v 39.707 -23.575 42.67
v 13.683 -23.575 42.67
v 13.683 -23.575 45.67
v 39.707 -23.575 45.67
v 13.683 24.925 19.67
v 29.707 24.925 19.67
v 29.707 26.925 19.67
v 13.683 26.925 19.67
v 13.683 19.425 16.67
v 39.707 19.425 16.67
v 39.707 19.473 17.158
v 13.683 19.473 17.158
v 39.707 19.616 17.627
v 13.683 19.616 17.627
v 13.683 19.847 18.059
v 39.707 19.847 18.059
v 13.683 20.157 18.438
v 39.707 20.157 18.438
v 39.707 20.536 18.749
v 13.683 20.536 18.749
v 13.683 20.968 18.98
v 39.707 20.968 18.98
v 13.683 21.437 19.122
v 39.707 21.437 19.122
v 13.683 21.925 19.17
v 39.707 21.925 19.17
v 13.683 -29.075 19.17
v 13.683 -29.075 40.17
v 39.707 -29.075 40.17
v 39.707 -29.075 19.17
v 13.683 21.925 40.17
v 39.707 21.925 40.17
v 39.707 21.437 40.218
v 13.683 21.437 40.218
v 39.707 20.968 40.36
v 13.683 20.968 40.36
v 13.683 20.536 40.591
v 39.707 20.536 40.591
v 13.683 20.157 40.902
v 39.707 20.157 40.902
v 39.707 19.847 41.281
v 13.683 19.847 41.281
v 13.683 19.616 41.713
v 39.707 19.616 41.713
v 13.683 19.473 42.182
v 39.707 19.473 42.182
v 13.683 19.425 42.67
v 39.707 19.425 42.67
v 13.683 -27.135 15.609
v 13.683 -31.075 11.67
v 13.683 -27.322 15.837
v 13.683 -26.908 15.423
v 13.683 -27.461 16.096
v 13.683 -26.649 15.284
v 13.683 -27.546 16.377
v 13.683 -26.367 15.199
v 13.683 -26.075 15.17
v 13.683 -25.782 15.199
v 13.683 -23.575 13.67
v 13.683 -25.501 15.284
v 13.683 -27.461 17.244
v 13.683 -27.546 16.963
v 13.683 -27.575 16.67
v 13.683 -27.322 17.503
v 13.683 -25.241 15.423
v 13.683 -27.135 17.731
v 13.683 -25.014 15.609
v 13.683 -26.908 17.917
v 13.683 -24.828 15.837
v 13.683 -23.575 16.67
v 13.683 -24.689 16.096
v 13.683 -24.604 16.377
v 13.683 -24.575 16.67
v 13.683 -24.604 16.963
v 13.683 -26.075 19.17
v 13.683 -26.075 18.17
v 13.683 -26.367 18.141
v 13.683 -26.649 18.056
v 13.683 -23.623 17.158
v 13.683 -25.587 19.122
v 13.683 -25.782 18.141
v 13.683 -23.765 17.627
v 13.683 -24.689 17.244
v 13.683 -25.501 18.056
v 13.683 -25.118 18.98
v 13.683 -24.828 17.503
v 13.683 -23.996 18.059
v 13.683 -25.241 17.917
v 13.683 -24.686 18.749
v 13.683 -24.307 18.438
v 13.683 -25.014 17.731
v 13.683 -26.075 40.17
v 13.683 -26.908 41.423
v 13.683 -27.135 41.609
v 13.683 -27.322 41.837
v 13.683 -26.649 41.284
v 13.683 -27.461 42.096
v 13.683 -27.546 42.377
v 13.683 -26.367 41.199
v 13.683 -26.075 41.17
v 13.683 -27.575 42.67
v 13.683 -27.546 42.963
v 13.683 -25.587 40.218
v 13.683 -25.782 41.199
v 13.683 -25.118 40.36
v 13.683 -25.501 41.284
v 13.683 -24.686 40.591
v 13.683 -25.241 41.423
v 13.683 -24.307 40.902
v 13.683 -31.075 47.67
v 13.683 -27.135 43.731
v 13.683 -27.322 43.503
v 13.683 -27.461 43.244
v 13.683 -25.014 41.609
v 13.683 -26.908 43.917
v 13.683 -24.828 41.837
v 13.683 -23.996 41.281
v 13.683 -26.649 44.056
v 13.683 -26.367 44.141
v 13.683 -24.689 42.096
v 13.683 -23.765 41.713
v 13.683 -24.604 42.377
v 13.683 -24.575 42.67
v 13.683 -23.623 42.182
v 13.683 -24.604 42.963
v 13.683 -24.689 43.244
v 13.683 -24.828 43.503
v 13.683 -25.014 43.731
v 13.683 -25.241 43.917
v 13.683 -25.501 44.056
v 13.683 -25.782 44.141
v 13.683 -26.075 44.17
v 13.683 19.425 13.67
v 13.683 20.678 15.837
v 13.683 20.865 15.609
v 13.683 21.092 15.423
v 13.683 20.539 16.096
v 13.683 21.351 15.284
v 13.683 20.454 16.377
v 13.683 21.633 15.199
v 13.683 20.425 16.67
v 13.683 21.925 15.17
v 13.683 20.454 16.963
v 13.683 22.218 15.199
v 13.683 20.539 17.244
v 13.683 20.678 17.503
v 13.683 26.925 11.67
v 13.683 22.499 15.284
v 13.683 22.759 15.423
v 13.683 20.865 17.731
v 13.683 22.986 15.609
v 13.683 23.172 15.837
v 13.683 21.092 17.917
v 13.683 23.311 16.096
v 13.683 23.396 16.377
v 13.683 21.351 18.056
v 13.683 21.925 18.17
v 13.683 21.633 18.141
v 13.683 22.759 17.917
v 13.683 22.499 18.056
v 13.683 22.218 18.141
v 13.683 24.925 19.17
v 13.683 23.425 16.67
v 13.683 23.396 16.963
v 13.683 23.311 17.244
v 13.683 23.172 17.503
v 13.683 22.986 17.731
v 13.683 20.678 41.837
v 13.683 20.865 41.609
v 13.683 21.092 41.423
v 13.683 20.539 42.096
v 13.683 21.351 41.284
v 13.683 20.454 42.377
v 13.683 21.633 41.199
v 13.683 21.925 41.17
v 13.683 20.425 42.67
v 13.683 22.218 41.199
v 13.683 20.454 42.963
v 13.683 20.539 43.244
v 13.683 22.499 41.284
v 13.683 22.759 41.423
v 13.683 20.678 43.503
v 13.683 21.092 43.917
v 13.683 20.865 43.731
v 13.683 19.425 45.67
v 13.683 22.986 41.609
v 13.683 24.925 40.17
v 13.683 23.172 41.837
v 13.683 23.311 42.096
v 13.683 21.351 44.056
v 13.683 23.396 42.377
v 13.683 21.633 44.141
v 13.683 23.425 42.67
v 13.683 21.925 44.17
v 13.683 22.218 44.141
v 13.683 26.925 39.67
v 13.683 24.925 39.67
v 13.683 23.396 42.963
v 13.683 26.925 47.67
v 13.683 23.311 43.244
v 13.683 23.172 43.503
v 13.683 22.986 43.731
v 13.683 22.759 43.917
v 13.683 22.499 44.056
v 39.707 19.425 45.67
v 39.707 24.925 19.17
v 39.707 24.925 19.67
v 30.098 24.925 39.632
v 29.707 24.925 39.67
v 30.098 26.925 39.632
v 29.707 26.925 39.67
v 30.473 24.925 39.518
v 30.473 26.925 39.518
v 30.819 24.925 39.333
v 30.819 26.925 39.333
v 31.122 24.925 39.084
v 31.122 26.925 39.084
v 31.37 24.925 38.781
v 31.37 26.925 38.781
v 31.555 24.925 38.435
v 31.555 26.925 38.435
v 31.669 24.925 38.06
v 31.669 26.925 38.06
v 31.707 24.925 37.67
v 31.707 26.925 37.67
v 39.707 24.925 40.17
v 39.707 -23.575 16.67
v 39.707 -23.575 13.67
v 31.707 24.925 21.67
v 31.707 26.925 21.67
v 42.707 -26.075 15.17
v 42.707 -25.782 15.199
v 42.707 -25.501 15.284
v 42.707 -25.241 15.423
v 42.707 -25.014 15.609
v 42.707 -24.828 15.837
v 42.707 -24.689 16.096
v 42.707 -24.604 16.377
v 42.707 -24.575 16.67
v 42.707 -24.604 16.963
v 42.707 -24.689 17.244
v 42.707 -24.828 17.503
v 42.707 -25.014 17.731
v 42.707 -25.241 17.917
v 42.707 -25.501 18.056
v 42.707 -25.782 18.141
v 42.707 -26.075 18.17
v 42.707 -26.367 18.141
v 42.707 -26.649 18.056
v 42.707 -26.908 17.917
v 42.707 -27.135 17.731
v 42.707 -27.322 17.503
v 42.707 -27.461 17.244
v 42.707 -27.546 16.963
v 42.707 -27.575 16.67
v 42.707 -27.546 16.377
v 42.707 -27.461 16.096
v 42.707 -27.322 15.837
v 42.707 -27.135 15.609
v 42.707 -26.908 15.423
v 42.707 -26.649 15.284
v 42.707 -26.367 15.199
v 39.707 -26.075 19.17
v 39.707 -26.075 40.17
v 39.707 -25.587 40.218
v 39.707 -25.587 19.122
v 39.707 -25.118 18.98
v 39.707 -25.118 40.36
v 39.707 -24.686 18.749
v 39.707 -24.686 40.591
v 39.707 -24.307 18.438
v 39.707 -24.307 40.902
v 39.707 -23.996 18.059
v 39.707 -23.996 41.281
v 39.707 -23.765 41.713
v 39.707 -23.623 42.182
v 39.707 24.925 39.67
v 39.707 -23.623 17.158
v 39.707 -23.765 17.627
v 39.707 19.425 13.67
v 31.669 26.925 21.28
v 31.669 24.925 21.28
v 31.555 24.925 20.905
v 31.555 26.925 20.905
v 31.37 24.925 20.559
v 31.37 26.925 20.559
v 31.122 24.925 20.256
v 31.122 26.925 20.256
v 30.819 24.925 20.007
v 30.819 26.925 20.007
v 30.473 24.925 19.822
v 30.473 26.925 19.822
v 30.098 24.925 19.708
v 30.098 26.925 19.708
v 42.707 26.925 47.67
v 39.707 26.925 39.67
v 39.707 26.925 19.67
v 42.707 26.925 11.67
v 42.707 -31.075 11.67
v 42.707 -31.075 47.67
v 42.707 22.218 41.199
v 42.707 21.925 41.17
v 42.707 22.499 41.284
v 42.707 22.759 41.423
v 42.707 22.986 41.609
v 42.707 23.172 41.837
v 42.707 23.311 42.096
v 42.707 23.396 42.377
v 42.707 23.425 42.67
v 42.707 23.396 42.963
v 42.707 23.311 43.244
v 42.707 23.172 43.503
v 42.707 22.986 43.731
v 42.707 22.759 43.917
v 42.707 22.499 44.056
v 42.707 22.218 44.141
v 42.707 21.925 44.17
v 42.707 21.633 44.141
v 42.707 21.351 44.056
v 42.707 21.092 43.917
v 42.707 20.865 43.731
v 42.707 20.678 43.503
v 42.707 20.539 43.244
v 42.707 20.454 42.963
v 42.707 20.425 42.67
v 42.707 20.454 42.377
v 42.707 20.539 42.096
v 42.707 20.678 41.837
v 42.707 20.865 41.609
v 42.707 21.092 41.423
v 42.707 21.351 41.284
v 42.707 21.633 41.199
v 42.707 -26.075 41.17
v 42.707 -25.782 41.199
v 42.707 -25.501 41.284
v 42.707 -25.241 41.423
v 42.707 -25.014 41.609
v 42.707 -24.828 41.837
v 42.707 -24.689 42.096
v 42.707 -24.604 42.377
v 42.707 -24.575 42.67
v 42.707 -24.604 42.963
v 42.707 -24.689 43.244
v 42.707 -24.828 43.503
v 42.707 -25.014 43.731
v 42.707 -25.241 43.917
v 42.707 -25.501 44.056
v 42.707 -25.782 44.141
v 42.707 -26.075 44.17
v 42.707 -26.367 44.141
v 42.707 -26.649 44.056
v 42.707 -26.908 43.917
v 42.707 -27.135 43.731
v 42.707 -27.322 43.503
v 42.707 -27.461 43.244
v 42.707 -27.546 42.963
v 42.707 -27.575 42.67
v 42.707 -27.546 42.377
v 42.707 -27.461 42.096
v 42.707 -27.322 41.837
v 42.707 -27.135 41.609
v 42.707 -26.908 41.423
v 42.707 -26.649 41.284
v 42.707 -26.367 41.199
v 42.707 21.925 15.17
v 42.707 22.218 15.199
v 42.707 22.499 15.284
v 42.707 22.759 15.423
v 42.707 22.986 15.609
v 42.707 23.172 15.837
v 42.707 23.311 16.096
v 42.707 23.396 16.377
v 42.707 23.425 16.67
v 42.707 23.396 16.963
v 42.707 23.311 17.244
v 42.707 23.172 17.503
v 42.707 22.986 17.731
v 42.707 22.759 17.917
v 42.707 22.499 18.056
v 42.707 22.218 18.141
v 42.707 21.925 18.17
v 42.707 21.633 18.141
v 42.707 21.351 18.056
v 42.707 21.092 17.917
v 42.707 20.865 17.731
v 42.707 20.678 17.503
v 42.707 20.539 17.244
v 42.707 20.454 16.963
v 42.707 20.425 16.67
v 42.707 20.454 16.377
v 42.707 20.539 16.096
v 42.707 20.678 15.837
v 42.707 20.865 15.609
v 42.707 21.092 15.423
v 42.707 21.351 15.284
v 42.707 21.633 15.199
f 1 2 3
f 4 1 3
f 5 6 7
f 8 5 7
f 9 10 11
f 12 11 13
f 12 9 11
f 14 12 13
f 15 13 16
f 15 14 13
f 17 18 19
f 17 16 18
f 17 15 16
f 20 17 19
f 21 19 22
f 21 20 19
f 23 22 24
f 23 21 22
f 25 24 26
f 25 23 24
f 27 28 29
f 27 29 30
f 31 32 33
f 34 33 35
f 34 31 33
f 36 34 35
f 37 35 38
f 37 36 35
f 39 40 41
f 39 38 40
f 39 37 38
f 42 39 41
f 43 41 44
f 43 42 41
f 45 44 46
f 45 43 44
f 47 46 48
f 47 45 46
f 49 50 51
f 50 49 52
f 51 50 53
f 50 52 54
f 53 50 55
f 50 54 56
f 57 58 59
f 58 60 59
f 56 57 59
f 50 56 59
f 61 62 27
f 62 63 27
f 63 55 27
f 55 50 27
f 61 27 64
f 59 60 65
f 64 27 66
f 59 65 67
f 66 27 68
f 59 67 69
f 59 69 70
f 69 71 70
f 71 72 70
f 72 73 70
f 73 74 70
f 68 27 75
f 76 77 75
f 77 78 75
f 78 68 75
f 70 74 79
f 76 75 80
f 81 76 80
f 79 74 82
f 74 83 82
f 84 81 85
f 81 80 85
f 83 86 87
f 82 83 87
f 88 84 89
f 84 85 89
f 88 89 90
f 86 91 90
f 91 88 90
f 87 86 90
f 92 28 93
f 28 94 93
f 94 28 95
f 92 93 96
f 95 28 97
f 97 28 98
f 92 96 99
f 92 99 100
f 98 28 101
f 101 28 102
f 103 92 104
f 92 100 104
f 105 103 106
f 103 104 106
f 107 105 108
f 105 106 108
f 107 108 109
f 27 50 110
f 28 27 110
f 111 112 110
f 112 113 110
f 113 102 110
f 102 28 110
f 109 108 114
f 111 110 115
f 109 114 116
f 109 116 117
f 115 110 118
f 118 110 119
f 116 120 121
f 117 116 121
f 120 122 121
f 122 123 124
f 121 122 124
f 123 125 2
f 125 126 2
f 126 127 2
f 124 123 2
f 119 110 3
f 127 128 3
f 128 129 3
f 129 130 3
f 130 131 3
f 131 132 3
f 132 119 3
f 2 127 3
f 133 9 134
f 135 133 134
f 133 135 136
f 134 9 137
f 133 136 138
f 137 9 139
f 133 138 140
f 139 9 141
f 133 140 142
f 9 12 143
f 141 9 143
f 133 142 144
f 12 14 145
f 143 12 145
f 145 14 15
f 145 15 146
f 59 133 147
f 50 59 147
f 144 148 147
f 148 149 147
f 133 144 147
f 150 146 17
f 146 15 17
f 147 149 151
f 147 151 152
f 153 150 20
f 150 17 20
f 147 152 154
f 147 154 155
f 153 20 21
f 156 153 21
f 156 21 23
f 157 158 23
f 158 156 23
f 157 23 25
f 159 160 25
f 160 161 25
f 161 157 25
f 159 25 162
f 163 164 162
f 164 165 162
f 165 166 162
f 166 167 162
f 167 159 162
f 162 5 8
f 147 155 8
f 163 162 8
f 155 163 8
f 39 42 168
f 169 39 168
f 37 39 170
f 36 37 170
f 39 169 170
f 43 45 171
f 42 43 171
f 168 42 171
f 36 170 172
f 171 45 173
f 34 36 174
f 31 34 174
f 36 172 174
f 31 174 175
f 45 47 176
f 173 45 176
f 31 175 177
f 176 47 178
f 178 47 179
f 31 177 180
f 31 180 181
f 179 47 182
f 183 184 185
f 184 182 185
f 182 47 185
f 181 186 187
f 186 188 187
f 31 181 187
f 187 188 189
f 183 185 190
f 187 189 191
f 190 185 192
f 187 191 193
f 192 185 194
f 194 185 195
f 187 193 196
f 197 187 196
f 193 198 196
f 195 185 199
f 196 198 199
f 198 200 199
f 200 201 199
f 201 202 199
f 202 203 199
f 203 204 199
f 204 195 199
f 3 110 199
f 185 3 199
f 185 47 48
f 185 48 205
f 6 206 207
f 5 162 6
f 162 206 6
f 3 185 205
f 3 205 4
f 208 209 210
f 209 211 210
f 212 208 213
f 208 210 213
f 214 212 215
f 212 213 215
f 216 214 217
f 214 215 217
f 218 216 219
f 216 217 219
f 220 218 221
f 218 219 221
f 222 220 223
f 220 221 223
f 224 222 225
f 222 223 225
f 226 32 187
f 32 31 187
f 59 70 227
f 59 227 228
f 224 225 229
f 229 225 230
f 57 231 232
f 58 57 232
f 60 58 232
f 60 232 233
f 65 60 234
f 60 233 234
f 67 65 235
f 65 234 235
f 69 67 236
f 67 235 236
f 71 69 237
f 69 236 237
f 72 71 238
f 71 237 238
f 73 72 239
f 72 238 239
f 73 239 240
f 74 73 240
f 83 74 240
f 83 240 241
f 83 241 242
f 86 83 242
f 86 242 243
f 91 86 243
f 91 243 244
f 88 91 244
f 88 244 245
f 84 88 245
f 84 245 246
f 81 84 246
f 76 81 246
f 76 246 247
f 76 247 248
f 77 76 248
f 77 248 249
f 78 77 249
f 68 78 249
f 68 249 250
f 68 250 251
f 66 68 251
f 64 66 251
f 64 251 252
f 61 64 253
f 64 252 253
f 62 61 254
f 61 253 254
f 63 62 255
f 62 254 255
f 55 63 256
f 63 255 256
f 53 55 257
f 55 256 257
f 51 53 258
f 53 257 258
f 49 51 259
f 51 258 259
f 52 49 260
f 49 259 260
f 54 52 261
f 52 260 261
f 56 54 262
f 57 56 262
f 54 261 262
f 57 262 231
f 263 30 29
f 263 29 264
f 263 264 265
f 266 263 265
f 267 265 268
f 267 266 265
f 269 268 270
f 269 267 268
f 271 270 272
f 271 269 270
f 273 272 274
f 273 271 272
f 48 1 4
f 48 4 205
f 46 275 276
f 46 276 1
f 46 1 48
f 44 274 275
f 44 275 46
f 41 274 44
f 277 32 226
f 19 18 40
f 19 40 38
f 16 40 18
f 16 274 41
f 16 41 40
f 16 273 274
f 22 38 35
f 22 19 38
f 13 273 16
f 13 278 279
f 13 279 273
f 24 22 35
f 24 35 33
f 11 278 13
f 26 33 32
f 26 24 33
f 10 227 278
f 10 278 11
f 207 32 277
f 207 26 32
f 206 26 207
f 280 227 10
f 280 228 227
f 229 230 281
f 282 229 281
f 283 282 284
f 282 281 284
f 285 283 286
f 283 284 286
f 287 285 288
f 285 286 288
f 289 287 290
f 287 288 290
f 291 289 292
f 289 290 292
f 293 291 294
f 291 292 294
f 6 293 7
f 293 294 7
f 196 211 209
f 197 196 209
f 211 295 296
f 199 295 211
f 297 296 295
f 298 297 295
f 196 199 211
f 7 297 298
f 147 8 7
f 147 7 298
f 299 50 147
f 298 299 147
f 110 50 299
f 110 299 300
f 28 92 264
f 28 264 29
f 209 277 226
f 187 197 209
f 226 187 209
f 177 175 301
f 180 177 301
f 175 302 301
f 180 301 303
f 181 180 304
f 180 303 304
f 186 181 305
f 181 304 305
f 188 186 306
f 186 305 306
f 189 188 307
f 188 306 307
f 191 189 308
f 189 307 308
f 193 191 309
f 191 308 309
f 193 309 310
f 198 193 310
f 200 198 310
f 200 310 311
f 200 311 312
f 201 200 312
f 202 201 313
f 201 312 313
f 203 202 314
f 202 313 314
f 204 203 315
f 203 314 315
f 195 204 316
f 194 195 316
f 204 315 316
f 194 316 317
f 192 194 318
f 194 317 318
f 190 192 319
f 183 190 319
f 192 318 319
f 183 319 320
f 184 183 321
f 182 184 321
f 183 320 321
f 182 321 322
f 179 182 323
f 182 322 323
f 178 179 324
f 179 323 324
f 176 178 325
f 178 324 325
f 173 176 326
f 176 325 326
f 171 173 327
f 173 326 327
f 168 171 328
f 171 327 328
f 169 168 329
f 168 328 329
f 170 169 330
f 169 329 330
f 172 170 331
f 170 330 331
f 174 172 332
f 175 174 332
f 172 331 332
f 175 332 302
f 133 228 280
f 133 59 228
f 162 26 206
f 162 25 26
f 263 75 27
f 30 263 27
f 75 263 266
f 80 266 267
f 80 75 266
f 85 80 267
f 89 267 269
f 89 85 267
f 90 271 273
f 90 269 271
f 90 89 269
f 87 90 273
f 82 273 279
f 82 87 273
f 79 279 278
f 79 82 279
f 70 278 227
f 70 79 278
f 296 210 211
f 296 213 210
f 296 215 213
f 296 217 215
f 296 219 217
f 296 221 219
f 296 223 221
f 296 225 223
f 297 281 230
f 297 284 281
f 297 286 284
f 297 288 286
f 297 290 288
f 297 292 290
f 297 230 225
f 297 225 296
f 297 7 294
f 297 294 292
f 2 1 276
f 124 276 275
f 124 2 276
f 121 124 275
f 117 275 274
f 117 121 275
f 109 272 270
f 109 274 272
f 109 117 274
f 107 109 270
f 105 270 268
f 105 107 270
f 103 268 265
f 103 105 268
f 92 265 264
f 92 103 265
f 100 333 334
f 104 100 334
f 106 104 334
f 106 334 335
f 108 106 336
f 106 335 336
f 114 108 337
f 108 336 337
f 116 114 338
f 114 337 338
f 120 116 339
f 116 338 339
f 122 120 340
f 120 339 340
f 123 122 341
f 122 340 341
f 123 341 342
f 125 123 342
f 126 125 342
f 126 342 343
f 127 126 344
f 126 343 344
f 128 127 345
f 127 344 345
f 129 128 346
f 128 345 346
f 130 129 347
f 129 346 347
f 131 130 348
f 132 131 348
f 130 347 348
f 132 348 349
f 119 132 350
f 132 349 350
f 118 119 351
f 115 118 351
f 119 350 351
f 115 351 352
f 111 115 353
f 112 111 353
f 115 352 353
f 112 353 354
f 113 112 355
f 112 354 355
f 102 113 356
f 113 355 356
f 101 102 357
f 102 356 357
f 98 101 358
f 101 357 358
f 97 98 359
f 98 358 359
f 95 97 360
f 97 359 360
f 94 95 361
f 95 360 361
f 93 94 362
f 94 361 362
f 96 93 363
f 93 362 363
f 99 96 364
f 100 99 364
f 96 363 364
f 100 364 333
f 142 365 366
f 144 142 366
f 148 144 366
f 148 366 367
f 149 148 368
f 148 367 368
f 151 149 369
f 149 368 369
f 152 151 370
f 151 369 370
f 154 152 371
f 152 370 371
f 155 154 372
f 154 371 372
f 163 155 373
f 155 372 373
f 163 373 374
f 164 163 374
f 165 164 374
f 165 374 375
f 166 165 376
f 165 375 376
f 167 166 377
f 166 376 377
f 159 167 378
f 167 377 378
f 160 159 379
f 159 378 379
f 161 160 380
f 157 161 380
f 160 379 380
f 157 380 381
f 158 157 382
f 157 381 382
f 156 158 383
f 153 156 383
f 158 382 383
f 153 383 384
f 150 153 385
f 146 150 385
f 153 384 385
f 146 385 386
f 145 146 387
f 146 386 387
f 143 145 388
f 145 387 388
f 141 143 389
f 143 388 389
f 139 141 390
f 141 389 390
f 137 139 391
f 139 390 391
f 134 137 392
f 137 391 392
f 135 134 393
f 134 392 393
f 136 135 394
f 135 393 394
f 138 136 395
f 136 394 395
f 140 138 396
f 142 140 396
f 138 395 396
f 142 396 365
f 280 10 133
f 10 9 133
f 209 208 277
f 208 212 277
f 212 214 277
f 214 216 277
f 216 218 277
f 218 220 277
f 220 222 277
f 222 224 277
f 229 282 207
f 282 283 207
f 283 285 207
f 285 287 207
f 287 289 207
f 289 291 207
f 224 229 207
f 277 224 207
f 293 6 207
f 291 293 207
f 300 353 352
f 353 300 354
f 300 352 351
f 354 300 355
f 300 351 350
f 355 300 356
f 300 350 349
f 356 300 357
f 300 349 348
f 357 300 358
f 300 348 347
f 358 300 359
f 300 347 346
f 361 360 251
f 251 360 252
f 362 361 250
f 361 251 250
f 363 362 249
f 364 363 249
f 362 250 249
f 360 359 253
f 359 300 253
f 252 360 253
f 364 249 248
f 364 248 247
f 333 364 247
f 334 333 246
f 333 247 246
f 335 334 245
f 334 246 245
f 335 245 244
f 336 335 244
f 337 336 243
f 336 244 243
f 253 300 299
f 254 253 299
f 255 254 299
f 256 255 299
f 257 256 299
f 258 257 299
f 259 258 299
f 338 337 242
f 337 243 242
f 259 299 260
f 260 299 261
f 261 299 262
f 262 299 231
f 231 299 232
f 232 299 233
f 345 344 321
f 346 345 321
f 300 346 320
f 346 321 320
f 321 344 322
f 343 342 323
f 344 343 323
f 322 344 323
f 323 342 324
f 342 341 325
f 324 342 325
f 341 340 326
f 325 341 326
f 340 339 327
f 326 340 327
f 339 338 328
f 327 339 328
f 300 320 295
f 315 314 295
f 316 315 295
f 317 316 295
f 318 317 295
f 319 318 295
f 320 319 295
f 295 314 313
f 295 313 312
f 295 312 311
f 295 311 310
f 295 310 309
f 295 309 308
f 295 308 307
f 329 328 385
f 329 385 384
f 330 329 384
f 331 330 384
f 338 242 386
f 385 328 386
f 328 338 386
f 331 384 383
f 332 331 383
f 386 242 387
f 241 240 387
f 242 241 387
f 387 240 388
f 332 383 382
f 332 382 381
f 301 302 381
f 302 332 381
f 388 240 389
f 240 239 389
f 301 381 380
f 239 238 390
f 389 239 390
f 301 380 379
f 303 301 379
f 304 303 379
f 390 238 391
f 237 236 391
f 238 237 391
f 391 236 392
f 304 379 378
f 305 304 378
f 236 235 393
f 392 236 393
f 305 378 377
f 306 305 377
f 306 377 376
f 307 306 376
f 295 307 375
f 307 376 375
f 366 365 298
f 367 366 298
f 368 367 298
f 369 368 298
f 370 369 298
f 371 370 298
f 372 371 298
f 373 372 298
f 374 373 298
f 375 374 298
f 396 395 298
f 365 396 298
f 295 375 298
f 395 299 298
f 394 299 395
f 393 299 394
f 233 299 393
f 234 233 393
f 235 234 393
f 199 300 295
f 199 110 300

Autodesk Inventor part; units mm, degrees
ref_plane "YZ Plane" through (0, 0, 0) normal (1, 0, 0) x (0, 1, 0)
ref_plane "XZ Plane" through (0, 0, 0) normal (0, 1, 0) x (-1, 0, 0)
ref_plane "XY Plane" through (0, 0, 0) normal (0, 0, 1) x (1, 0, 0)
ref_plane "Work Plane1" through (13.6834, 18.9252, 14.6894) normal (1, 0, 0) x (0, 1, 0)
sketch "Sketch1" plane through (13.6834, 18.9252, 14.6894) normal (1, 0, 0) x (0, 1, 0)
  circle A0 centre (3, 27.9806) radius 1.5 projected
  circle A1 centre (3, 1.9806) radius 1.5 projected
  circle A2 centre (-45, 1.9806) radius 1.5 projected
  circle A3 centre (-45, 27.9806) radius 1.5 projected
  line L0 (-50, 32.9806) -> (8, 32.9806) projected
  line L1 (8, 32.9806) -> (8, 24.9805) projected
  line L2 (8, -3.0194) -> (8, 4.9808) projected
  line L3 (-50, -3.0194) -> (8, -3.0194) projected
  line L4 (-50, 0) -> (-50, 32.9806) projected
  line L5 (-50, -0.0388) -> (-50, -3.0194) projected
  line L6 (100, 24.9806) -> (0, 24.9806) projected
  line L7 (0, 22.9806) -> (0, 24.9806) projected
  line L8 (0, 22.9806) -> (0, 6.9806) projected
  line L9 (0, 4.9806) -> (0, 6.9806) projected
  line L10 (0, 4.9806) -> (100, 4.9806) projected
  line L11 (6, 24.9806) -> (6, 25.4806)
  line L12 (0.5, 30.9806) -> (-42.5, 30.9806)
  line L13 (-48, 25.4806) -> (-48, 4.4806)
  line L14 (-42.5, -1.0194) -> (0.5, -1.0194)
  line L15 (6, 4.4806) -> (6, 4.9806)
  arc A4 (0.5, 27.9806) -> (3, 25.4806) centre (3, 27.9806) ccw
  arc A5 (3, 4.4806) -> (0.5, 1.9806) centre (3, 1.9806) ccw
  arc A6 (-42.5, 1.9806) -> (-45, 4.4806) centre (-45, 1.9806) ccw
  arc A7 (-45, 25.4806) -> (-42.5, 27.9806) centre (-45, 27.9806) ccw
  line L16 (-45, 25.4806) -> (-48, 25.4806)
  line L17 (-42.5, 27.9806) -> (-42.5, 30.9806)
  line L18 (-45, 4.4806) -> (-48, 4.4806)
  line L19 (-42.5, 1.9806) -> (-42.5, -1.0194)
  line L20 (0.5, 1.9806) -> (0.5, -1.0194)
  line L21 (3, 4.4806) -> (6, 4.4806)
  line L22 (0.5, 27.9806) -> (0.5, 30.9806)
  line L23 (3, 25.4806) -> (6, 25.4806)
  circle A8 centre (-45, 1.9806) radius 1.5
  circle A9 centre (-45, 27.9806) radius 1.5
  circle A10 centre (3, 27.9806) radius 1.5
  circle A11 centre (3, 1.9806) radius 1.5
  line L24 (8, 4.9808) -> (8, -3.0194)
  line L25 (-50, -3.0194) -> (8, -3.0194)
  line L26 (-50, -3.0194) -> (-50, 32.9806)
  line L27 (8, 32.9806) -> (-50, 32.9806)
  line L28 (8, 24.9805) -> (8, 32.9806)
  line L29 (8, 24.9805) -> (0, 24.9806)
  line L30 (0, 4.9806) -> (0, 24.9806)
  line L31 (0, 4.9806) -> (8, 4.9808)
  point P0 (-18.9252, -14.6894)
  point P1 (8, 24.9806)
  point P2 (8, 4.9806)
  dimension "d0" = 2
  dimension "d1" = 2
  dimension "d2" = 2
  dimension "d3" = 2
  dimension "d4" = 2
  dimension "d5" = 5
  dimension "d6" = 5
  dimension "d7" = 5
  dimension "d8" = 5
extrude "Extrusion1" add sketch "Sketch1" along normal blind 26.024 contours L0 L1 L6 L11 L23 A4 L22 L12 L17 A7 L16 L13 L18 A6 L19 L14 L20 A5 L21 L15 L10 L2 L3 L5 L26 L4
sketch "Sketch2" plane through (13.6834, -31.0748, 11.67) normal (0, 0, -1) x (-1, 0, 0)
  line L0 (0, 0) -> (-26.024, 0) projected
  line L1 (-26.024, 0) -> (-29.024, 0)
  line L2 (-29.024, 0) -> (-29.024, 58)
  line L3 (-29.024, 58) -> (-25.5921, 58)
  line L4 (-26.024, 0) -> (-26.024, 58) projected
  line L5 (-26.024, 0) -> (-26.024, 58)
  point P0 (13.6834, 31.0748)
  dimension "d11" = 3
  dimension "d12" = 58
extrude "Extrusion2" add sketch "Sketch2" against normal up to surface (36 mm away)
sketch "Sketch3" plane through (42.7074, -31.0748, 11.67) normal (1, 0, 0) x (0, 0, -1)
  point P0 (11.67, 31.0748)
sketch "Sketch4" plane through (42.7074, -31.0748, 11.67) normal (1, 0, 0) x (0, 0, -1)
  circle A0 centre (-31, 53) radius 1.5 projected
  circle A1 centre (-5, 53) radius 1.5 projected
  circle A2 centre (-5, 5) radius 1.5 projected
  circle A3 centre (-31, 5) radius 1.5 projected
  point P0 (11.67, 31.0748)
extrude "Extrusion3" cut sketch "Sketch4" against normal through all
sketch "Sketch5" plane through (13.6834, 26.9252, 47.67) normal (0, 1, 0) x (1, 0, 0)
  line L0 (18.024, 10) -> (18.024, 26) projected
  arc A0 (18.024, 26) -> (16.024, 28) centre (16.024, 26) ccw projected
  arc A1 (16.024, 8) -> (18.024, 10) centre (16.024, 10) ccw projected
  line L1 (0.024, 8) -> (16.024, 8) projected
  line L2 (16.024, 28) -> (0.024, 28) projected
  line L3 (0, 8) -> (0, 0) projected
  line L4 (0, 0) -> (29.024, 0) projected
  line L5 (29.024, 36) -> (29.024, 0) projected
  line L6 (0, 36) -> (29.024, 36) projected
  line L7 (0, 36) -> (0, 28) projected
  line L8 (0, 28) -> (26.024, 28) projected
  line L9 (26.024, 28) -> (26.024, 8) projected
  line L10 (0, 8) -> (26.024, 8) projected
  point P0 (-13.6834, 47.67)
  point P1 (16.024, 8)
extrude "Extrusion4" add sketch "Sketch5" against normal blind 2 contours L0 A0 L8 L9 L10 A1
properties part number "enclosure"
